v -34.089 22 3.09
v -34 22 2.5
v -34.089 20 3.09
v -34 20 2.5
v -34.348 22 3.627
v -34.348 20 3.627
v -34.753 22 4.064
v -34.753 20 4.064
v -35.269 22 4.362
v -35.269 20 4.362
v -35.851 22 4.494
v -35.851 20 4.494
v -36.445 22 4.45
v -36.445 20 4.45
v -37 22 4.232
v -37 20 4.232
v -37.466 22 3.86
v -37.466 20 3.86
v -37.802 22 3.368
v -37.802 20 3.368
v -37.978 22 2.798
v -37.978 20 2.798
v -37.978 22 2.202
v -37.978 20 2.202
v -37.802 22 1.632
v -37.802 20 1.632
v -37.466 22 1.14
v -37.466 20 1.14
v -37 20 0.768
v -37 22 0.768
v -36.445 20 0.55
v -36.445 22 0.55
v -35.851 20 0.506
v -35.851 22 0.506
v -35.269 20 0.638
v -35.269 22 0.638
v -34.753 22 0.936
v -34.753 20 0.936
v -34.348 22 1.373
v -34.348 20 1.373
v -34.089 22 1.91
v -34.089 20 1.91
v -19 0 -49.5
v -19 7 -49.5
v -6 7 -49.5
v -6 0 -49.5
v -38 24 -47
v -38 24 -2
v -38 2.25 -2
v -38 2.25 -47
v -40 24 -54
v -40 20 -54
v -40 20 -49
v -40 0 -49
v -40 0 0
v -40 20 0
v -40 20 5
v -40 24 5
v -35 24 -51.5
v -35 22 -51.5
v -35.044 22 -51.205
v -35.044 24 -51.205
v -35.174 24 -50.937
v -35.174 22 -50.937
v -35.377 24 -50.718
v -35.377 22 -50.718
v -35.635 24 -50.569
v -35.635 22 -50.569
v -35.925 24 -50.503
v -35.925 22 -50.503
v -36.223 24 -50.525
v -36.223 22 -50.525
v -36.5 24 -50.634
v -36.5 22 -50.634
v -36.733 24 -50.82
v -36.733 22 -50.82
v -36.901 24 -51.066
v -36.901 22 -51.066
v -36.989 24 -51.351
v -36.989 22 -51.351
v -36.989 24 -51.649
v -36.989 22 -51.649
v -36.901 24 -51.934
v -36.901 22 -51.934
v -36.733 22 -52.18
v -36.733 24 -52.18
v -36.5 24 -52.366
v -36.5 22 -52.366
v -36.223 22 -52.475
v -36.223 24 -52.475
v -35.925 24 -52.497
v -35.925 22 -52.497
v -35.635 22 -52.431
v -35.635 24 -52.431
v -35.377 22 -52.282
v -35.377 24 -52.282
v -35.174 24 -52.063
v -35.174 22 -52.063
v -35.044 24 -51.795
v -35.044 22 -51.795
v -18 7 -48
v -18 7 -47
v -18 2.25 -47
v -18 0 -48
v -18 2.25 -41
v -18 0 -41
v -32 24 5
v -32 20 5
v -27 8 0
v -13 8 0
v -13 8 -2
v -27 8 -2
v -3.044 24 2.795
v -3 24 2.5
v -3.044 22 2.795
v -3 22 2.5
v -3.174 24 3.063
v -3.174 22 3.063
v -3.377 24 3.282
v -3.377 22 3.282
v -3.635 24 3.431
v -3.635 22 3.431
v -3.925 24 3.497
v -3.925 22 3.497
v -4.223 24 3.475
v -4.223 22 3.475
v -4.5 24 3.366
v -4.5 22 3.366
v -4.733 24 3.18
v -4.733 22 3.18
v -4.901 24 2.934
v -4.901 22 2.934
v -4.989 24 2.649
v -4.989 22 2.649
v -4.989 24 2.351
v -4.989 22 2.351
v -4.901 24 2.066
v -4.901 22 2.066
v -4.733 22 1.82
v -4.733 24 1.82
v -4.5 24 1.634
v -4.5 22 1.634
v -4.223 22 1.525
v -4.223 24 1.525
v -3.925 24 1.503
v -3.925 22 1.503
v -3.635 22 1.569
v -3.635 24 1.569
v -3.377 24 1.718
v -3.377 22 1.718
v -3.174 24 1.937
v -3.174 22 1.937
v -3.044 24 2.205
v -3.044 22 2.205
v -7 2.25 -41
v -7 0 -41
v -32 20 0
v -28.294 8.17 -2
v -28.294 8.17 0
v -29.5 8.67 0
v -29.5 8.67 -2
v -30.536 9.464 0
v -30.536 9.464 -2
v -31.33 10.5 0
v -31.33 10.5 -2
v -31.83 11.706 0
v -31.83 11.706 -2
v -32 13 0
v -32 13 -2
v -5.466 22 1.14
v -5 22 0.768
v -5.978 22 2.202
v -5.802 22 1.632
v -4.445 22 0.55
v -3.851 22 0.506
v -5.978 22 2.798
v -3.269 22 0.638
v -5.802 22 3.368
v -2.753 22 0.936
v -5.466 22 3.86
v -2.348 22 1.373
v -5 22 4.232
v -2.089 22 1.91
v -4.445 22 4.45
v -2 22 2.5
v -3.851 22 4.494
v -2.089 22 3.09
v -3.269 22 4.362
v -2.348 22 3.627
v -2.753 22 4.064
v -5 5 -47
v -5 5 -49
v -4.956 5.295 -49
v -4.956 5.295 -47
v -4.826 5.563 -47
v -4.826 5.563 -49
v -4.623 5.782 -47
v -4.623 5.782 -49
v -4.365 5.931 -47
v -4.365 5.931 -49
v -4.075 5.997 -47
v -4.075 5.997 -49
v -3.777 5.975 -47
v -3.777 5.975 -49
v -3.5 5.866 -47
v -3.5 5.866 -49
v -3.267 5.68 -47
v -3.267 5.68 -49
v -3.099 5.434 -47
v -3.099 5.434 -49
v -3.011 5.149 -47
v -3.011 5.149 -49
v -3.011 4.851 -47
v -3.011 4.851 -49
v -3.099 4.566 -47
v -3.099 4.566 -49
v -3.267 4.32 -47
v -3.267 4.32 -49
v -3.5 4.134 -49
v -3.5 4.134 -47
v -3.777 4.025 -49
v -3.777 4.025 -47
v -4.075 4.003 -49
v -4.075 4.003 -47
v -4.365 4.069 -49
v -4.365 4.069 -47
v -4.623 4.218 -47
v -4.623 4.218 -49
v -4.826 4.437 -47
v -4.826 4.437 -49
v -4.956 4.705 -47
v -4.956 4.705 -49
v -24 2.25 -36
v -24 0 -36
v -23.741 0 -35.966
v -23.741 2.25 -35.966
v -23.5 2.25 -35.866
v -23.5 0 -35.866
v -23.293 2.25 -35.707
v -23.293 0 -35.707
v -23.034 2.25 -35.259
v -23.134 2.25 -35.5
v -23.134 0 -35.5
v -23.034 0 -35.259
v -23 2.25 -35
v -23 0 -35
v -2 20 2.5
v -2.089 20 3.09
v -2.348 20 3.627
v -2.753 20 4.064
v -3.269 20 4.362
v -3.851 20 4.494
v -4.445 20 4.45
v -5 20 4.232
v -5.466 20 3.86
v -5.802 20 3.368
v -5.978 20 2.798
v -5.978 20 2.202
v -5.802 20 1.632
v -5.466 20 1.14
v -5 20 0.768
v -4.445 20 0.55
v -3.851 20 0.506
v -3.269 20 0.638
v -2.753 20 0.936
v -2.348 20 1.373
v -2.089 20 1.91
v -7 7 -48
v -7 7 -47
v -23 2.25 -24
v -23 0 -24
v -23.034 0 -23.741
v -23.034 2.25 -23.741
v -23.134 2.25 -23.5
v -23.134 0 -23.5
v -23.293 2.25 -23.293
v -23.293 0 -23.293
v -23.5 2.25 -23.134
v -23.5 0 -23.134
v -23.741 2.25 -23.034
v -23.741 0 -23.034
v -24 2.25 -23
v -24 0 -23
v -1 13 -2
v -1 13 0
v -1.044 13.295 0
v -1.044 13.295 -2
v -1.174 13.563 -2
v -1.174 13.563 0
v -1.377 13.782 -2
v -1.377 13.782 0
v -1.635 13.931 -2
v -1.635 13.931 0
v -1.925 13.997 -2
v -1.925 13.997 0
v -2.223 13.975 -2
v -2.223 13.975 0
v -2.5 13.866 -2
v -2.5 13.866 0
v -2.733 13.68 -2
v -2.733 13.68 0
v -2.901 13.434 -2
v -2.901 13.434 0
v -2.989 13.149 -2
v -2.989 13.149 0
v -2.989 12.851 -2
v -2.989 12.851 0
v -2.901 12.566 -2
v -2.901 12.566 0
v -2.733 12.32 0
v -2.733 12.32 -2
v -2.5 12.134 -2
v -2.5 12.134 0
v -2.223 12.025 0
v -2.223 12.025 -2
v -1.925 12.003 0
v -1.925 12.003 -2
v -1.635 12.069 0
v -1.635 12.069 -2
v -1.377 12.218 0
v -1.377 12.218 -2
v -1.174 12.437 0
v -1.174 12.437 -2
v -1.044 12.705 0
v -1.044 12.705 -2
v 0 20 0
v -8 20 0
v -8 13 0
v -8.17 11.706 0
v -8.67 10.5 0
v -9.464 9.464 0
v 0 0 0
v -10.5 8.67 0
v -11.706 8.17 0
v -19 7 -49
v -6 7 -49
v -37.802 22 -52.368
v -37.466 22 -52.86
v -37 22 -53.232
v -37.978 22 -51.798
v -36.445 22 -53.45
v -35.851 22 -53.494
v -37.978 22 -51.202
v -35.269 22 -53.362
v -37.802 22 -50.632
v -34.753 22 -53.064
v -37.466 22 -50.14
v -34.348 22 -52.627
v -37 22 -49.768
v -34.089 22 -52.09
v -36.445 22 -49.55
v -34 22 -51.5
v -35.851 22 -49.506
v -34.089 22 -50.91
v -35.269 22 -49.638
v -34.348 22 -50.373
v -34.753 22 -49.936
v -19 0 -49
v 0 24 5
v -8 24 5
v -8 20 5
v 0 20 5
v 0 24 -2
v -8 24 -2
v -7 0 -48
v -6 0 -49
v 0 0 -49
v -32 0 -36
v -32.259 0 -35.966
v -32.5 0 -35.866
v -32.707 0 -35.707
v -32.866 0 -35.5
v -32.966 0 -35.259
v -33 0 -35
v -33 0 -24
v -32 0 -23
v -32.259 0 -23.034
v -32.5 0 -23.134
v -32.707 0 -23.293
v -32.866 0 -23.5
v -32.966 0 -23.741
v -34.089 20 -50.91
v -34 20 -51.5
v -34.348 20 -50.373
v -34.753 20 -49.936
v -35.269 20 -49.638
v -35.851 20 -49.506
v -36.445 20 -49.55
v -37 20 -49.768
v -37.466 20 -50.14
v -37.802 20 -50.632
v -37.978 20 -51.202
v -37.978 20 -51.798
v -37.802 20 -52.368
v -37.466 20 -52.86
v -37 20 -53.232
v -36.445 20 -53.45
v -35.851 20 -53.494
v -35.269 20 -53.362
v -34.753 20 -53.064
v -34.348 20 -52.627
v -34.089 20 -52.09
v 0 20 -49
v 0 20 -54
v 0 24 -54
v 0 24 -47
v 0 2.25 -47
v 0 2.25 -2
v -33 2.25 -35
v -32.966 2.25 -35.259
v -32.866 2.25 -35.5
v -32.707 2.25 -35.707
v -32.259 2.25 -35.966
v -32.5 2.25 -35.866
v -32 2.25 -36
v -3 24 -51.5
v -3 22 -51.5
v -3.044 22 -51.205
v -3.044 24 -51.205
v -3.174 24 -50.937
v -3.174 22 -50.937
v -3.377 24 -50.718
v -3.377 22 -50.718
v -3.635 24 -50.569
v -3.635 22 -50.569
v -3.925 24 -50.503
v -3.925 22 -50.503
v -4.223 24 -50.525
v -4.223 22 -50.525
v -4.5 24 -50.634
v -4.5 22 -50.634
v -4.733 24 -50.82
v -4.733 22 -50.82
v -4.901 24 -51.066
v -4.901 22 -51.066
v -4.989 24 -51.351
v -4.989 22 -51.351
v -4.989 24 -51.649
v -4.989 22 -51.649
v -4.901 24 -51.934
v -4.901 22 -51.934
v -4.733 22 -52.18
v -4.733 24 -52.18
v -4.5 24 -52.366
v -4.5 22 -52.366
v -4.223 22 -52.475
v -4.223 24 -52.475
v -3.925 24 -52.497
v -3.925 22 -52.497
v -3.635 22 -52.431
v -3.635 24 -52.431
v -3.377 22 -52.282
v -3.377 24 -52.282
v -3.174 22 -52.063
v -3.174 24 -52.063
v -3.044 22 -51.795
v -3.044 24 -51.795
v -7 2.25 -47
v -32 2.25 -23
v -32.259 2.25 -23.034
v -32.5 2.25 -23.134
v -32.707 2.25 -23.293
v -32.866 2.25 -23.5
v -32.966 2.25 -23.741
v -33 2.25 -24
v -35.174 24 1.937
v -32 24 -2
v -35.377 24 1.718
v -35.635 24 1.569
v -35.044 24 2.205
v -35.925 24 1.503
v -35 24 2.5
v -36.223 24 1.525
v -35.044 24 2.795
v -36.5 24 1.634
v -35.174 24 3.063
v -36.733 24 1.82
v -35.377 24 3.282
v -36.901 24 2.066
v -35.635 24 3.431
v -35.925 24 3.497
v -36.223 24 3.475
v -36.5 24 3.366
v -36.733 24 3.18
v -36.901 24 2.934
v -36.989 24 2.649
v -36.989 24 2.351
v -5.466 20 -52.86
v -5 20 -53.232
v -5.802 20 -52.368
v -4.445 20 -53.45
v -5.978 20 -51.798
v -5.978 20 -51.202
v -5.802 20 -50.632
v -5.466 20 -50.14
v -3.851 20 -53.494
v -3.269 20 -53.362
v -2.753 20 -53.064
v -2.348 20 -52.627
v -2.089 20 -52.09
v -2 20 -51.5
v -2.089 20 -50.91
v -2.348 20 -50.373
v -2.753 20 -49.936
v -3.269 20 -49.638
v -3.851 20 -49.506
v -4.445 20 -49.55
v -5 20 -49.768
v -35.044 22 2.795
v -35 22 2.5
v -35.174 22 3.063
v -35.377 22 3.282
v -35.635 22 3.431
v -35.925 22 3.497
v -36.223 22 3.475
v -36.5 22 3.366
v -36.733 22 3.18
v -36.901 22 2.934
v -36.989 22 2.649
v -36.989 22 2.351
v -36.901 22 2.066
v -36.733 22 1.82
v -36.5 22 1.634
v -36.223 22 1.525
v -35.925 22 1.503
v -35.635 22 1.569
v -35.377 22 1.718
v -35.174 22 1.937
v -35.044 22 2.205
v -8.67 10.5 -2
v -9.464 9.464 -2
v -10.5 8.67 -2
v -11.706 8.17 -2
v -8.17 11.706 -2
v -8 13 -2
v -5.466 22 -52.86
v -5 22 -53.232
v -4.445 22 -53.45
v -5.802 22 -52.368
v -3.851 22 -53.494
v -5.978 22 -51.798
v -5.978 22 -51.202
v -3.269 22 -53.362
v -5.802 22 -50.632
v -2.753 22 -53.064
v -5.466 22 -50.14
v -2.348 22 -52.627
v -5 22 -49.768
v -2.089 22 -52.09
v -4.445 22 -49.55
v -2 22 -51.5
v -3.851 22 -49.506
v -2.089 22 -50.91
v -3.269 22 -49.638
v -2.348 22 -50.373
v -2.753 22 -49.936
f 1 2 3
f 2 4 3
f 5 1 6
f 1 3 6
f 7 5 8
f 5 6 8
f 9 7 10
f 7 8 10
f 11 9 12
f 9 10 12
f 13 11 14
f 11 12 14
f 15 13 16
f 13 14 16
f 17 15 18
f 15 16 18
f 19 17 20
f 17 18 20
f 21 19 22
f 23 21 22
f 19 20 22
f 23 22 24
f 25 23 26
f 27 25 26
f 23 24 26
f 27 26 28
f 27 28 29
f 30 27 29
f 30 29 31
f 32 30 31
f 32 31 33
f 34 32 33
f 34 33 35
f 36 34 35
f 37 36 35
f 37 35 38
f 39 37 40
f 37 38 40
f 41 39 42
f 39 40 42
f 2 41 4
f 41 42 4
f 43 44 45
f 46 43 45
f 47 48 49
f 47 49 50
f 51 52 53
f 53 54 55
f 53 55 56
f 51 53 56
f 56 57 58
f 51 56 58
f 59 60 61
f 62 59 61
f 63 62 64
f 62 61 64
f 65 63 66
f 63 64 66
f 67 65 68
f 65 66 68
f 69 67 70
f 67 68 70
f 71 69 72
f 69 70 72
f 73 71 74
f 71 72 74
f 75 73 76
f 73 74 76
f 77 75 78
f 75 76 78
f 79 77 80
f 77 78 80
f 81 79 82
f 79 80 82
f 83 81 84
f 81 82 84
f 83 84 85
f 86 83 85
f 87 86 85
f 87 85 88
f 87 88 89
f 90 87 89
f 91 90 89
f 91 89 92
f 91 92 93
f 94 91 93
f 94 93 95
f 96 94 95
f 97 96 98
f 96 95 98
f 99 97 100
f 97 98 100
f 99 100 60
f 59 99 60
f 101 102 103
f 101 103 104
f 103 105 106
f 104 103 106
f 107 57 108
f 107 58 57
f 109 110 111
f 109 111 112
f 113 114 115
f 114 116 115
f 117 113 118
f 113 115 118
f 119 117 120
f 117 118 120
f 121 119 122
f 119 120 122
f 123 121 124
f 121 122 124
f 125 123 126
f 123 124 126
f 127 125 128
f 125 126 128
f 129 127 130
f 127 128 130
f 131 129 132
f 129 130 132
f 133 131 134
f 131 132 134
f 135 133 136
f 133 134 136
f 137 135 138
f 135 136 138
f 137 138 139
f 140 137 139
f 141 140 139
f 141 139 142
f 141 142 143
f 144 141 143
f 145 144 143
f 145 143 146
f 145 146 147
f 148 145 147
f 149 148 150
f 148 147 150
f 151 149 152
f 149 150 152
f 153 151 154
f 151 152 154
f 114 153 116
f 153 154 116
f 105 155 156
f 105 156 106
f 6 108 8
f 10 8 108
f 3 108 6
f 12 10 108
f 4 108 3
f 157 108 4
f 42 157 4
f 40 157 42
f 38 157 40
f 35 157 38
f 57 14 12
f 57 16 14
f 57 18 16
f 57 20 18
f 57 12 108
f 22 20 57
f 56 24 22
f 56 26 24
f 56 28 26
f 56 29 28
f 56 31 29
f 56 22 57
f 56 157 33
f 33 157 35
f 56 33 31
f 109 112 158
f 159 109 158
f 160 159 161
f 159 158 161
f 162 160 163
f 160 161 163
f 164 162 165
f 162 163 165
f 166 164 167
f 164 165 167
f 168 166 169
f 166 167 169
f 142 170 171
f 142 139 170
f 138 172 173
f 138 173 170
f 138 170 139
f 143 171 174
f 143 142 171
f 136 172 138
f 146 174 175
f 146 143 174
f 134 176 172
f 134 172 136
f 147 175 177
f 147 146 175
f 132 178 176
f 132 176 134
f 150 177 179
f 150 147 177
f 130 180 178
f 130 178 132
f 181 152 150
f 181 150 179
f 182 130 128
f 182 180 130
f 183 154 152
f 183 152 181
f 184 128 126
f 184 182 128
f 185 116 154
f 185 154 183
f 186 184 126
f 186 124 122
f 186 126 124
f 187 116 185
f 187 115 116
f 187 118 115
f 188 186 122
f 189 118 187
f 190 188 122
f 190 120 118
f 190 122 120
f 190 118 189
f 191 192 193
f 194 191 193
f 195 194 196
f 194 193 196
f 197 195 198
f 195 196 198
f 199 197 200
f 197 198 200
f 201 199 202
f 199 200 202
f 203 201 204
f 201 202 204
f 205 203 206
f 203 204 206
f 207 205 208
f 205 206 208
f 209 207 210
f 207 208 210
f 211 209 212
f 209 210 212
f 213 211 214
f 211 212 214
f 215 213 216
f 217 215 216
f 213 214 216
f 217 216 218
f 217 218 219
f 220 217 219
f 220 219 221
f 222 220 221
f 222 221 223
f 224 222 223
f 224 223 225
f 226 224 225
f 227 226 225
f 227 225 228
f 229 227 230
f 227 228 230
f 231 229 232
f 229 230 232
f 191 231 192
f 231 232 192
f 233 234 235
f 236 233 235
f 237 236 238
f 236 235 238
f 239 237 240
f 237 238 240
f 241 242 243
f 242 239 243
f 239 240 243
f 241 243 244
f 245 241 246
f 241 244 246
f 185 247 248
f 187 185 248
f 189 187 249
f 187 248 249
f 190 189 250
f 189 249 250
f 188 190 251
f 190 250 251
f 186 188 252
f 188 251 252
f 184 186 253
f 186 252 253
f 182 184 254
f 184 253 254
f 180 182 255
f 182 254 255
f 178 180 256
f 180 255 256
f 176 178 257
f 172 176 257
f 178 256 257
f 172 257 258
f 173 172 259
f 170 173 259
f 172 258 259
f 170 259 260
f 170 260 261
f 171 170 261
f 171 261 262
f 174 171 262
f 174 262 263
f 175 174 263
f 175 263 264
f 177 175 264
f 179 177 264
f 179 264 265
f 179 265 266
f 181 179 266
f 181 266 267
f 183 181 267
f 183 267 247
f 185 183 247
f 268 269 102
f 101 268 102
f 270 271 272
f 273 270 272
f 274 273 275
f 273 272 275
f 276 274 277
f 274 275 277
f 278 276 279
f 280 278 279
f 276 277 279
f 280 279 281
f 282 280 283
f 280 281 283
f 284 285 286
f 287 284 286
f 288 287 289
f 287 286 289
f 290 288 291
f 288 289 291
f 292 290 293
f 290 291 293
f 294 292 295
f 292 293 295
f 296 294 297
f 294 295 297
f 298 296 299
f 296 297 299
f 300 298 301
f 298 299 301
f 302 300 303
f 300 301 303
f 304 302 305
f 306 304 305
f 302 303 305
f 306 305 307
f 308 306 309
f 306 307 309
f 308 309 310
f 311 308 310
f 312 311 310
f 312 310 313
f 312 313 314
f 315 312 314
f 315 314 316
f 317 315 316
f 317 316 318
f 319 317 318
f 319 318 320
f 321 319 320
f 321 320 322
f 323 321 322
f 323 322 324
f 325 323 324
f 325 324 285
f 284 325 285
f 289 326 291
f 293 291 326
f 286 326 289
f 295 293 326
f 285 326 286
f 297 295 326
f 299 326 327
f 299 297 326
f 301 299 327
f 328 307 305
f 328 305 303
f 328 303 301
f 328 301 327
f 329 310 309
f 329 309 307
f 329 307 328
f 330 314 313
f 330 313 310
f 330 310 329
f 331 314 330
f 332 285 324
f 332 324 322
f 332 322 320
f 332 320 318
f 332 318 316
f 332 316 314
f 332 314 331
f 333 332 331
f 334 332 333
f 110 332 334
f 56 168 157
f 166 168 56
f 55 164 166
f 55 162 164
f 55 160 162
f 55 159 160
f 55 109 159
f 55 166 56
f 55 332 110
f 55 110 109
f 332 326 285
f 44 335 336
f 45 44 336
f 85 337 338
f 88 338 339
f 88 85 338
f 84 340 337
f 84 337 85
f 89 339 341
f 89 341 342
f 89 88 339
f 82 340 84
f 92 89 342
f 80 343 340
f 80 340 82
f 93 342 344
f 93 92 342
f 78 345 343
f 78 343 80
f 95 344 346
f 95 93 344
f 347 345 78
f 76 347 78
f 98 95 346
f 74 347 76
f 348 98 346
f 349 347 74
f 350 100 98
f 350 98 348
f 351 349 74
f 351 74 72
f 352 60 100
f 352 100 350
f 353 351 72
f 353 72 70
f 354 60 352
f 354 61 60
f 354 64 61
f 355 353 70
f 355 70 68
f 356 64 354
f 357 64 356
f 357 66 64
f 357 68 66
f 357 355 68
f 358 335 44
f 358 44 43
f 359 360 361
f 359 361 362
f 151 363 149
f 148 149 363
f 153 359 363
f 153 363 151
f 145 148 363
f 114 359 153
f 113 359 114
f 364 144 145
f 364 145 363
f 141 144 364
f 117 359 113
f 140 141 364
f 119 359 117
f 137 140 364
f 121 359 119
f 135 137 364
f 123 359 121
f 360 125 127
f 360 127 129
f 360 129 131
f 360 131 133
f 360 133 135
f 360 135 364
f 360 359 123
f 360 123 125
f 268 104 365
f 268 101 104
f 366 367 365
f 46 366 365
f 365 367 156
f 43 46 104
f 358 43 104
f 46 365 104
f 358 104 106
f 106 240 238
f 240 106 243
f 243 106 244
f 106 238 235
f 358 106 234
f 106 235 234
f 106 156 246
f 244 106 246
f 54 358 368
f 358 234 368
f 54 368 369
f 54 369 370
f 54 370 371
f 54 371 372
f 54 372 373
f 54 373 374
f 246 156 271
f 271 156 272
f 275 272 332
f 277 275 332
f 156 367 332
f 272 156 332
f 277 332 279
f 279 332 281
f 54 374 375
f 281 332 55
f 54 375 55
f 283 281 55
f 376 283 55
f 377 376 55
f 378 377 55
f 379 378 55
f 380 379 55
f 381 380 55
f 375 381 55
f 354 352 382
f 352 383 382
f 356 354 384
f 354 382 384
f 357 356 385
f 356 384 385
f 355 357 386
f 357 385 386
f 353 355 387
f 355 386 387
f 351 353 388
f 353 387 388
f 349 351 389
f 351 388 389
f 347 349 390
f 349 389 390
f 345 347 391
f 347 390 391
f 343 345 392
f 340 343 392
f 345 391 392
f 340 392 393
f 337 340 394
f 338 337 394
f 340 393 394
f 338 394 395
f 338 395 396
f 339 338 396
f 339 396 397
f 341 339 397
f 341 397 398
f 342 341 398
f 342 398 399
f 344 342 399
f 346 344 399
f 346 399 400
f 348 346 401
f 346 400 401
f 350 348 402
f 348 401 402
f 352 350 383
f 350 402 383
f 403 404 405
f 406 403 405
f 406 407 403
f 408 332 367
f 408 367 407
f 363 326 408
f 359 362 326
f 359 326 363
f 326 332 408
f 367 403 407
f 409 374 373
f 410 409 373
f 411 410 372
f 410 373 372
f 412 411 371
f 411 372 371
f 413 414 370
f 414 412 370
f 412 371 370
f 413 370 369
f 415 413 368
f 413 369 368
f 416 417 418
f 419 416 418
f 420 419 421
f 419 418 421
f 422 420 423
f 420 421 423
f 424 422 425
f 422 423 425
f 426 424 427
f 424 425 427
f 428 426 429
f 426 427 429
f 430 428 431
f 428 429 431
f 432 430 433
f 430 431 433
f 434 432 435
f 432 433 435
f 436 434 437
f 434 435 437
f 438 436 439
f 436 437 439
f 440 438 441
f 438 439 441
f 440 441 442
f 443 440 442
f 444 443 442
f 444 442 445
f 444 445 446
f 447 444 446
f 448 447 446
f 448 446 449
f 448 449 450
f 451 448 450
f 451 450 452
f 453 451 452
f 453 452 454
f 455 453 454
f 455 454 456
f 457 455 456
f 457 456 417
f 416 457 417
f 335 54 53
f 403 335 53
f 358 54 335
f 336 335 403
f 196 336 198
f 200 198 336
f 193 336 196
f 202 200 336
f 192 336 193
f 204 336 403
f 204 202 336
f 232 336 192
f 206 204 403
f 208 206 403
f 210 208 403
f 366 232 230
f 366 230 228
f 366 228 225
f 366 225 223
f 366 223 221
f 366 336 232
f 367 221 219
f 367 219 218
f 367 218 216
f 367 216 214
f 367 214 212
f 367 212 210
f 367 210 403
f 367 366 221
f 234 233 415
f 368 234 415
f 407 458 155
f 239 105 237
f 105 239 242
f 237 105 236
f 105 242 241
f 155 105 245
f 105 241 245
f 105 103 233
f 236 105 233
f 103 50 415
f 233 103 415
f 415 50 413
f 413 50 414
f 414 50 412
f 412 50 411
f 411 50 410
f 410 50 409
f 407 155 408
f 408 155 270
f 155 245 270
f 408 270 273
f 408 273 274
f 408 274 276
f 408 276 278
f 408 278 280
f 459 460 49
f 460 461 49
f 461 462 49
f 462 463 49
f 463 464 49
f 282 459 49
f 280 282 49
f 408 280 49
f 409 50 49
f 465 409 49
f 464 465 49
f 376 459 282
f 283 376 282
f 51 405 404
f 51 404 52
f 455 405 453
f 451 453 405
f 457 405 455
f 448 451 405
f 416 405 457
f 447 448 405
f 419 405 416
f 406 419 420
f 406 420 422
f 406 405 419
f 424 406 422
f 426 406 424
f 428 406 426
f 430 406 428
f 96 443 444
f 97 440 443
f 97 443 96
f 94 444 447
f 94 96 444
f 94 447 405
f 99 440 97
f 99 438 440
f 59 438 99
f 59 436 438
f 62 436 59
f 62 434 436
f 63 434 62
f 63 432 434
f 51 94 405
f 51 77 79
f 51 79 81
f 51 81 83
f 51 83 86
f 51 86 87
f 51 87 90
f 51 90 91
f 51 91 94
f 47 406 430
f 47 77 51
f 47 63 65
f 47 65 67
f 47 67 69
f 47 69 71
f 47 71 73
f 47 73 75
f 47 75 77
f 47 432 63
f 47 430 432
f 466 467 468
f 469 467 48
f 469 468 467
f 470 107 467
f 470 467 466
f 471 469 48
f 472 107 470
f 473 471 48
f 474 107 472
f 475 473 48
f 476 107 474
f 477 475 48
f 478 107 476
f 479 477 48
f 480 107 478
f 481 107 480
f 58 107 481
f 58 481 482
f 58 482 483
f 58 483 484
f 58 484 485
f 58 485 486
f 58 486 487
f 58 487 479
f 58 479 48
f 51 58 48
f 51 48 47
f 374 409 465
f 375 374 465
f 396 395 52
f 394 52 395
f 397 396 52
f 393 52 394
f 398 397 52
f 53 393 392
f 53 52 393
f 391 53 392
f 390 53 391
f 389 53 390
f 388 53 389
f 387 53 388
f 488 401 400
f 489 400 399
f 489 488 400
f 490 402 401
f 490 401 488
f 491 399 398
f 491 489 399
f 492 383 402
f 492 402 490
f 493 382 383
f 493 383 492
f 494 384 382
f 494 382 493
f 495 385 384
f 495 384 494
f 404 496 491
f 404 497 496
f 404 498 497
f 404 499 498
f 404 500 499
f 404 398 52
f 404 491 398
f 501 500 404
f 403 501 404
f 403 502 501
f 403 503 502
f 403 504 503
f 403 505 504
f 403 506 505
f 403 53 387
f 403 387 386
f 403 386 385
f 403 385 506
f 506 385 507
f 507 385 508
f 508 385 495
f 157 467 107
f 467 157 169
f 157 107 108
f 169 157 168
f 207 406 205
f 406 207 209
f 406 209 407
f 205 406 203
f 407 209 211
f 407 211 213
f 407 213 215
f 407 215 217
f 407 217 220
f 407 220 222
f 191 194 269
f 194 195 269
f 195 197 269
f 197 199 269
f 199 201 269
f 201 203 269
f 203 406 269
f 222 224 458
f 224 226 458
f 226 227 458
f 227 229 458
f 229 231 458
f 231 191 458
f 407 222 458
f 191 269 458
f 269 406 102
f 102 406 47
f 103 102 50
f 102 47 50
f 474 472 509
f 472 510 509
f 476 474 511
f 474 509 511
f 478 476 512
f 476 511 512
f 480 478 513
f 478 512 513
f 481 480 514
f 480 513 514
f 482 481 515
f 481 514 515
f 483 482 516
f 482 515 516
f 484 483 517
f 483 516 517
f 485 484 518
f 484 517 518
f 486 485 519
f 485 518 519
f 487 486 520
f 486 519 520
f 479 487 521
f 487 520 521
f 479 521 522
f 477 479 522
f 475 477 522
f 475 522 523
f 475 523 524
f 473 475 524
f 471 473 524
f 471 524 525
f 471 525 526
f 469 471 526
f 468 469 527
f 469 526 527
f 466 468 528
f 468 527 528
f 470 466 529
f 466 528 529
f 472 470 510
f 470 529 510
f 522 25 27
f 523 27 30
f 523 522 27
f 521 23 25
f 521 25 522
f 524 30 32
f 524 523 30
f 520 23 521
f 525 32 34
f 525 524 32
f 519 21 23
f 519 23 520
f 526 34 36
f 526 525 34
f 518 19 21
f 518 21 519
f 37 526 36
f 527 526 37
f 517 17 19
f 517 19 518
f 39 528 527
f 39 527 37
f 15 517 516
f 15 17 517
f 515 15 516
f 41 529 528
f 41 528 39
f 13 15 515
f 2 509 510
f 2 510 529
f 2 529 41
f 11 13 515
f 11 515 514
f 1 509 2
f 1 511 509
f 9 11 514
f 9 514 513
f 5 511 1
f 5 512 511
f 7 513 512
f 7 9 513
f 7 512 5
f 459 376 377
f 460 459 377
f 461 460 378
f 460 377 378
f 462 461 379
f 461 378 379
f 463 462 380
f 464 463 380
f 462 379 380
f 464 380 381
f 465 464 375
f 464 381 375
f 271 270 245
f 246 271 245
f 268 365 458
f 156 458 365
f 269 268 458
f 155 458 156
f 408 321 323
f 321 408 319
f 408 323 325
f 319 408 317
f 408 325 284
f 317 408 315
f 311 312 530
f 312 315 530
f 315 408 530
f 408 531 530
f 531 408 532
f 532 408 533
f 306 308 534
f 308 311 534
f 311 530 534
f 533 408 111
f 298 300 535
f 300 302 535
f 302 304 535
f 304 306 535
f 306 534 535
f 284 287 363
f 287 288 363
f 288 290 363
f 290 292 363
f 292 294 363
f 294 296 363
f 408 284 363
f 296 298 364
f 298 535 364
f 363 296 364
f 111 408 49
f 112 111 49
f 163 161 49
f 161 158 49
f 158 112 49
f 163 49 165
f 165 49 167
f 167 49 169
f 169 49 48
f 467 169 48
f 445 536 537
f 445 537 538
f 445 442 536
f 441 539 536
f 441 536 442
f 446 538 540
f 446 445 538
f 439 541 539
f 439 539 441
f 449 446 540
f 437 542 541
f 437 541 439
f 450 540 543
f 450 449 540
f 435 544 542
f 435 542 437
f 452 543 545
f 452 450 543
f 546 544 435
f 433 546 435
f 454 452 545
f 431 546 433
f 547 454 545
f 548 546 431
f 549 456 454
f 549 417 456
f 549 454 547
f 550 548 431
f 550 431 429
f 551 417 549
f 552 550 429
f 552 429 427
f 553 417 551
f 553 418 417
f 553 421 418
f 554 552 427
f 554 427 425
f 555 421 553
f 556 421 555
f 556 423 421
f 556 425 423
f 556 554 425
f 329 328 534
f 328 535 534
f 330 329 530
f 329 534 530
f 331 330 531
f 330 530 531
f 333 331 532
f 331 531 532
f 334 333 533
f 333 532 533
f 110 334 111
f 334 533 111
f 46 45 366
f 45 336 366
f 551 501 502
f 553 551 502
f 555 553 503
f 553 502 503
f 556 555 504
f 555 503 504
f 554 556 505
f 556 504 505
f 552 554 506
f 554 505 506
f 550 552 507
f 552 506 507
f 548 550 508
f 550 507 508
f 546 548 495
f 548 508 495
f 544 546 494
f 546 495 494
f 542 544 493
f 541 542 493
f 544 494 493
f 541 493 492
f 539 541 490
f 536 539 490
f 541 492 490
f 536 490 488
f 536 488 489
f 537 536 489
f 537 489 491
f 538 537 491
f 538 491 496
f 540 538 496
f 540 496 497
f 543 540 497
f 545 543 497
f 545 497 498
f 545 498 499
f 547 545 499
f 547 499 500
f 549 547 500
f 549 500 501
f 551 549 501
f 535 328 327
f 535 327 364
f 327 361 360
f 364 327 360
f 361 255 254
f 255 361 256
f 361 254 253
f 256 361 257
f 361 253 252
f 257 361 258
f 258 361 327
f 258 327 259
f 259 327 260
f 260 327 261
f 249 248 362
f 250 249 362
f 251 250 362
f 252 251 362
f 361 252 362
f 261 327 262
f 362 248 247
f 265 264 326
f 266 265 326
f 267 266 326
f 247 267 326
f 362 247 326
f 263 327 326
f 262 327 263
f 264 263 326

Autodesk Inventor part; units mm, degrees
ref_plane "YZ Plane" through (0, 0, 0) normal (1, 0, 0) x (0, 1, 0)
ref_plane "XZ Plane" through (0, 0, 0) normal (0, 1, 0) x (-1, 0, 0)
ref_plane "XY Plane" through (0, 0, 0) normal (0, 0, 1) x (1, 0, 0)
sketch "Sketch1" plane through (0, 0, 0) normal (0, 1, 0) x (-1, 0, 0)
  line L0 (0, 0) -> (40, 0)
  line L1 (40, 0) -> (40, -49)
  line L2 (40, -49) -> (0, -49)
  line L3 (0, -49) -> (0, 0)
  dimension "d0" = 40
  dimension "d1" = 49
extrude "Extrusion1" add sketch "Sketch1" along normal blind 24
sketch "Sketch2" plane through (0, 24, 0) normal (0, 1, 0) x (1, 0, 0)
  line L0 (0, 0) -> (0, 49) projected
  line L1 (0, 49) -> (-40, 49) projected
  line L2 (0, 0) -> (-2, 0)
  line L3 (-2, 0) -> (-2, 49)
  line L4 (-2, 49) -> (0, 49)
  line L5 (0, 49) -> (0, 0)
  line L6 (-40, 49) -> (-40, 0) projected
  line L7 (-40, 0) -> (-38, 0)
  line L8 (-38, 0) -> (-38, 49)
  line L9 (-38, 49) -> (-40, 49)
  line L10 (-40, 49) -> (-40, 0)
  line L11 (0, 0) -> (-40, 0)
  line L12 (-40, 0) -> (-40, 2)
  line L13 (-40, 2) -> (0, 2)
  line L14 (0, 2) -> (0, 0)
  line L15 (0, 49) -> (-40, 49)
  line L16 (-40, 49) -> (-40, 47)
  line L17 (-40, 47) -> (0, 47)
  line L18 (0, 47) -> (0, 49)
  line L19 (-2, 47) -> (-38, 47)
  line L20 (-38, 47) -> (-38, 2)
  line L21 (-38, 2) -> (-2, 2)
  line L22 (-2, 2) -> (-2, 47)
  point P0 (-38, 47)
  dimension "d4" = 2
  dimension "d5" = 2
  dimension "d6" = 2
  dimension "d7" = 2
extrude "Extrusion2" cut sketch "Sketch2" against normal blind 21.75 contours L13 L8 L17 L3
sketch "Sketch3" plane through (-40, 0, 0) normal (0, 0, 1) x (1, 0, 0)
  line L0 (0, 24) -> (40, 24) projected
  line L1 (0, 0) -> (40, 0) projected
  line L2 (0, 24) -> (8, 24)
  line L3 (8, 24) -> (8, 0)
  line L4 (8, 0) -> (0, 0)
  line L5 (0, 0) -> (0, 24)
  line L6 (0, 0) -> (0, 24) projected
  line L7 (40, 0) -> (40, 24) projected
  line L8 (0, 0) -> (40, 0)
  line L9 (40, 0) -> (40, 8)
  line L10 (40, 8) -> (0, 8)
  line L11 (0, 8) -> (0, 0)
  line L12 (38, 24) -> (2, 24) projected
  line L13 (40, 0) -> (32, 0)
  line L14 (32, 0) -> (32, 24)
  line L15 (32, 24) -> (40, 24)
  line L16 (40, 24) -> (40, 0)
  line L17 (8, 24) -> (32, 24)
  line L18 (32, 24) -> (32, 8)
  line L19 (32, 8) -> (8, 8)
  line L20 (8, 8) -> (8, 24)
  point P0 (8, 8)
  dimension "d10" = 8
  dimension "d11" = 8
  dimension "d12" = 8
extrude "Extrusion3" cut sketch "Sketch3" against normal blind 21 contours L0 L14 L10 L3
fillet "Fillet1" radius 5 2 edges at (-32, 8, -1) (-8, 8, -1)
sketch "Sketch4" plane through (-40, 0, 0) normal (0, 0, 1) x (1, 0, 0)
  line L0 (0, 0) -> (0, 24) projected
  line L1 (8, 13) -> (8, 24) projected
  line L2 (0, 24) -> (8, 24)
  line L3 (8, 24) -> (8, 20)
  line L4 (8, 20) -> (0, 20)
  line L5 (0, 20) -> (0, 24)
  line L6 (32, 24) -> (40, 24) projected
  line L7 (32, 13) -> (32, 24) projected
  line L8 (40, 24) -> (32, 24)
  line L9 (32, 24) -> (32, 20)
  line L10 (32, 20) -> (40, 20)
  line L11 (40, 20) -> (40, 24)
  point P0 (40, 0)
  point P1 (0, 20)
  dimension "d16" = 4
  dimension "d17" = 4
extrude "Extrusion4" add sketch "Sketch4" along normal blind 5
sketch "Sketch5" plane through (0, 0, -49) normal (0, 0, -1) x (-1, 0, 0)
  line L0 (40, 0) -> (40, 24) projected
  line L1 (0, 24) -> (40, 24)
  line L2 (40, 24) -> (40, 20)
  line L3 (40, 20) -> (0, 20)
  line L4 (0, 20) -> (0, 24)
  point P0 (0, 0)
  dimension "d20" = 4
extrude "Extrusion5" add sketch "Sketch5" along normal blind 5
sketch "Sketch6" plane through (-2, 24, -47) normal (-1, 0, 0) x (0, 0, 1)
  line L0 (0, 0) -> (0, -21.75) projected
  line L1 (0, 0) -> (45, 0) projected
  line L2 (0, -21.75) -> (45, -21.75)
  line L3 (45, -21.75) -> (45, 0)
  line L4 (45, 0) -> (0, 0)
  line L5 (0, 0) -> (0, -21.75)
  point P0 (47, -24)
extrude "Extrusion6" cut sketch "Sketch6" against normal blind 10
sketch "Sketch7" plane through (0, 2.25, 0) normal (0, 1, 0) x (1, 0, 0)
  line L0 (-38, 47) -> (-23, 47)
  line L1 (-23, 47) -> (-23, 36)
  line L2 (-23, 36) -> (-38, 36)
  line L3 (-38, 36) -> (-38, 47)
  line L4 (-23, 36) -> (-33, 36)
  line L5 (-33, 36) -> (-33, 23)
  line L6 (-33, 23) -> (-23, 23)
  line L7 (-23, 23) -> (-23, 36)
  line L8 (-38, 47) -> (0, 47) projected
  line L9 (-23, 23) -> (-18, 23)
  line L10 (-18, 23) -> (-18, 47)
  line L11 (-18, 47) -> (-23, 47)
  line L12 (-23, 47) -> (-23, 23)
  line L13 (-18, 47) -> (-7, 47)
  line L14 (-7, 47) -> (-7, 41)
  line L15 (-7, 41) -> (-18, 41)
  line L16 (-18, 41) -> (-18, 47)
  point P0 (0, 0)
  point P1 (-7, 47)
  dimension "d25" = 15
  dimension "d26" = 11
  dimension "d27" = 10
  dimension "d28" = 13
  dimension "d29" = 5
  dimension "d30" = 11
  dimension "d31" = 6
extrude "Extrusion7" cut sketch "Sketch7" against normal blind 10 contours L7 L6 L5 L2 | L8 L14 L15 L10
sketch "Sketch8" plane through (-38, 24, -47) normal (0, 0, 1) x (1, 0, 0)
  line L0 (20, -24) -> (31, -24)
  line L1 (31, -24) -> (31, -17)
  line L2 (31, -17) -> (20, -17)
  line L3 (20, -17) -> (20, -24)
  point P0 (38, -24)
  dimension "d34" = 11
  dimension "d35" = 7
extrude "Extrusion8" cut sketch "Sketch8" against normal blind 1
fillet "Fillet2" radius 1 4 edges at (-33, 1.125, -36) (-23, 1.125, -36) (-33, 1.125, -23) (-23, 1.125, -23)
sketch "Sketch9" plane through (-38, 24, -48) normal (0, 0, 1) x (1, 0, 0)
  line L0 (31, -24) -> (20, -24) projected
  line L1 (20, -17) -> (31, -17)
  line L2 (31, -17) -> (31, -24)
  line L3 (31, -24) -> (20, -24)
  line L4 (20, -24) -> (20, -17)
  line L5 (20, -24) -> (20, -17) projected
  line L6 (20, -17) -> (19, -17)
  line L7 (19, -17) -> (19, -24)
  line L8 (19, -24) -> (20, -24)
  line L9 (20, -24) -> (20, -17)
  line L10 (31, -17) -> (32, -17)
  line L11 (32, -17) -> (32, -24)
  line L12 (32, -24) -> (31, -24)
  line L13 (31, -24) -> (31, -17)
  point P0 (38, -24)
  point P1 (31, -24)
  dimension "d69" = 1
  dimension "d70" = 1
extrude "Extrusion9" add sketch "Sketch9" against normal blind 1.5
sketch "Sketch10" plane through (0, 0, 0) normal (0, -1, 0) x (1, 0, 0)
  line L0 (-8, 5) -> (0, 5) projected
  line L1 (0, 5) -> (-4, 5)
  line L2 (-4, 5) -> (-4, 2.5)
  line L3 (-4, 2.5) -> (0, 2.5)
  line L4 (0, 2.5) -> (0, 5)
  circle A0 centre (-4, 2.5) radius 1
  line L5 (-40, 0) -> (-40, 5) projected
  line L6 (-40, 5) -> (-36, 5)
  line L7 (-36, 5) -> (-36, 2.5)
  line L8 (-36, 2.5) -> (-40, 2.5)
  line L9 (-40, 2.5) -> (-40, 5)
  circle A1 centre (-36, 2.5) radius 1
  line L10 (-40, 5) -> (-40, -54) projected
  line L11 (-40, -54) -> (-36, -54)
  line L12 (-36, -54) -> (-36, -51.5)
  line L13 (-36, -51.5) -> (-40, -51.5)
  line L14 (-40, -51.5) -> (-40, -54)
  circle A2 centre (-36, -51.5) radius 1
  line L15 (0, -54) -> (0, -47) projected
  line L16 (0, -54) -> (-4, -54)
  line L17 (-4, -54) -> (-4, -51.5)
  line L18 (-4, -51.5) -> (0, -51.5)
  line L19 (0, -51.5) -> (0, -54)
  circle A3 centre (-4, -51.5) radius 1
  point P0 (0, 0)
  dimension "d41" = 4
  dimension "d42" = 2.5
  dimension "d43" = 2
  dimension "d44" = 4
  dimension "d45" = 2.5
  dimension "d46" = 2
  dimension "d49" = 4
  dimension "d50" = 2.5
  dimension "d51" = 2
  dimension "d53" = 4
  dimension "d54" = 2.5
  dimension "d55" = 2
extrude "Extrusion10" cut sketch "Sketch10" against normal blind 30 contours A0 L3 L2 | L2 L3 A0 | A1 L7 L8 | L8 L7 A1 | A2 L12 L13 | L13 L12 A2 | A3 L17 L18 | L18 L17 A3
sketch "Sketch11" plane through (-8, 20, 0) normal (0, -1, 0) x (1, 0, 0)
  circle A0 centre (4, 2.5) radius 1 projected
  circle A1 centre (4, 2.5) radius 2
  circle A2 centre (-28, 2.5) radius 1 projected
  circle A3 centre (-28, 2.5) radius 2
  circle A4 centre (4, -51.5) radius 1 projected
  circle A5 centre (4, -51.5) radius 2
  circle A6 centre (-28, -51.5) radius 1 projected
  circle A7 centre (-28, -51.5) radius 2
  point P0 (8, 0)
  dimension "d58" = 4
  dimension "d59" = 4
  dimension "d60" = 4
  dimension "d61" = 4
extrude "Extrusion11" cut sketch "Sketch11" against normal blind 2 contours A1 | A2 | A3 | A4 | A5 | A6 | A7
sketch "Sketch12" plane through (-40, 0, 0) normal (0, 0, 1) x (1, 0, 0)
  line L0 (0, 20) -> (40, 20) projected
  line L1 (40, 20) -> (38, 20)
  line L2 (38, 20) -> (38, 13)
  line L3 (38, 13) -> (40, 13)
  line L4 (40, 13) -> (40, 20)
  circle A0 centre (38, 13) radius 1
  point P0 (40, 0)
  dimension "d64" = 2
  dimension "d65" = 7
  dimension "d66" = 2
extrude "Extrusion12" cut sketch "Sketch12" against normal blind 5 contours A0 L3 L2 | L2 L3 A0
sketch "Sketch13" plane through (0, 20, -49) normal (0, 0, -1) x (-1, 0, 0)
  line L0 (6, -13) -> (19, -13) projected
  line L1 (6, -13) -> (4, -13)
  line L2 (4, -13) -> (4, -15)
  line L3 (4, -15) -> (6, -15)
  line L4 (6, -15) -> (6, -13)
  circle A0 centre (4, -15) radius 1
  point P0 (0, -20)
  dimension "d71" = 2
  dimension "d72" = 2
  dimension "d73" = 2
extrude "Extrusion13" cut sketch "Sketch13" against normal blind 3 contours A0 L3 L2 | L2 L3 A0
properties part number "encaixe1 mouse"
